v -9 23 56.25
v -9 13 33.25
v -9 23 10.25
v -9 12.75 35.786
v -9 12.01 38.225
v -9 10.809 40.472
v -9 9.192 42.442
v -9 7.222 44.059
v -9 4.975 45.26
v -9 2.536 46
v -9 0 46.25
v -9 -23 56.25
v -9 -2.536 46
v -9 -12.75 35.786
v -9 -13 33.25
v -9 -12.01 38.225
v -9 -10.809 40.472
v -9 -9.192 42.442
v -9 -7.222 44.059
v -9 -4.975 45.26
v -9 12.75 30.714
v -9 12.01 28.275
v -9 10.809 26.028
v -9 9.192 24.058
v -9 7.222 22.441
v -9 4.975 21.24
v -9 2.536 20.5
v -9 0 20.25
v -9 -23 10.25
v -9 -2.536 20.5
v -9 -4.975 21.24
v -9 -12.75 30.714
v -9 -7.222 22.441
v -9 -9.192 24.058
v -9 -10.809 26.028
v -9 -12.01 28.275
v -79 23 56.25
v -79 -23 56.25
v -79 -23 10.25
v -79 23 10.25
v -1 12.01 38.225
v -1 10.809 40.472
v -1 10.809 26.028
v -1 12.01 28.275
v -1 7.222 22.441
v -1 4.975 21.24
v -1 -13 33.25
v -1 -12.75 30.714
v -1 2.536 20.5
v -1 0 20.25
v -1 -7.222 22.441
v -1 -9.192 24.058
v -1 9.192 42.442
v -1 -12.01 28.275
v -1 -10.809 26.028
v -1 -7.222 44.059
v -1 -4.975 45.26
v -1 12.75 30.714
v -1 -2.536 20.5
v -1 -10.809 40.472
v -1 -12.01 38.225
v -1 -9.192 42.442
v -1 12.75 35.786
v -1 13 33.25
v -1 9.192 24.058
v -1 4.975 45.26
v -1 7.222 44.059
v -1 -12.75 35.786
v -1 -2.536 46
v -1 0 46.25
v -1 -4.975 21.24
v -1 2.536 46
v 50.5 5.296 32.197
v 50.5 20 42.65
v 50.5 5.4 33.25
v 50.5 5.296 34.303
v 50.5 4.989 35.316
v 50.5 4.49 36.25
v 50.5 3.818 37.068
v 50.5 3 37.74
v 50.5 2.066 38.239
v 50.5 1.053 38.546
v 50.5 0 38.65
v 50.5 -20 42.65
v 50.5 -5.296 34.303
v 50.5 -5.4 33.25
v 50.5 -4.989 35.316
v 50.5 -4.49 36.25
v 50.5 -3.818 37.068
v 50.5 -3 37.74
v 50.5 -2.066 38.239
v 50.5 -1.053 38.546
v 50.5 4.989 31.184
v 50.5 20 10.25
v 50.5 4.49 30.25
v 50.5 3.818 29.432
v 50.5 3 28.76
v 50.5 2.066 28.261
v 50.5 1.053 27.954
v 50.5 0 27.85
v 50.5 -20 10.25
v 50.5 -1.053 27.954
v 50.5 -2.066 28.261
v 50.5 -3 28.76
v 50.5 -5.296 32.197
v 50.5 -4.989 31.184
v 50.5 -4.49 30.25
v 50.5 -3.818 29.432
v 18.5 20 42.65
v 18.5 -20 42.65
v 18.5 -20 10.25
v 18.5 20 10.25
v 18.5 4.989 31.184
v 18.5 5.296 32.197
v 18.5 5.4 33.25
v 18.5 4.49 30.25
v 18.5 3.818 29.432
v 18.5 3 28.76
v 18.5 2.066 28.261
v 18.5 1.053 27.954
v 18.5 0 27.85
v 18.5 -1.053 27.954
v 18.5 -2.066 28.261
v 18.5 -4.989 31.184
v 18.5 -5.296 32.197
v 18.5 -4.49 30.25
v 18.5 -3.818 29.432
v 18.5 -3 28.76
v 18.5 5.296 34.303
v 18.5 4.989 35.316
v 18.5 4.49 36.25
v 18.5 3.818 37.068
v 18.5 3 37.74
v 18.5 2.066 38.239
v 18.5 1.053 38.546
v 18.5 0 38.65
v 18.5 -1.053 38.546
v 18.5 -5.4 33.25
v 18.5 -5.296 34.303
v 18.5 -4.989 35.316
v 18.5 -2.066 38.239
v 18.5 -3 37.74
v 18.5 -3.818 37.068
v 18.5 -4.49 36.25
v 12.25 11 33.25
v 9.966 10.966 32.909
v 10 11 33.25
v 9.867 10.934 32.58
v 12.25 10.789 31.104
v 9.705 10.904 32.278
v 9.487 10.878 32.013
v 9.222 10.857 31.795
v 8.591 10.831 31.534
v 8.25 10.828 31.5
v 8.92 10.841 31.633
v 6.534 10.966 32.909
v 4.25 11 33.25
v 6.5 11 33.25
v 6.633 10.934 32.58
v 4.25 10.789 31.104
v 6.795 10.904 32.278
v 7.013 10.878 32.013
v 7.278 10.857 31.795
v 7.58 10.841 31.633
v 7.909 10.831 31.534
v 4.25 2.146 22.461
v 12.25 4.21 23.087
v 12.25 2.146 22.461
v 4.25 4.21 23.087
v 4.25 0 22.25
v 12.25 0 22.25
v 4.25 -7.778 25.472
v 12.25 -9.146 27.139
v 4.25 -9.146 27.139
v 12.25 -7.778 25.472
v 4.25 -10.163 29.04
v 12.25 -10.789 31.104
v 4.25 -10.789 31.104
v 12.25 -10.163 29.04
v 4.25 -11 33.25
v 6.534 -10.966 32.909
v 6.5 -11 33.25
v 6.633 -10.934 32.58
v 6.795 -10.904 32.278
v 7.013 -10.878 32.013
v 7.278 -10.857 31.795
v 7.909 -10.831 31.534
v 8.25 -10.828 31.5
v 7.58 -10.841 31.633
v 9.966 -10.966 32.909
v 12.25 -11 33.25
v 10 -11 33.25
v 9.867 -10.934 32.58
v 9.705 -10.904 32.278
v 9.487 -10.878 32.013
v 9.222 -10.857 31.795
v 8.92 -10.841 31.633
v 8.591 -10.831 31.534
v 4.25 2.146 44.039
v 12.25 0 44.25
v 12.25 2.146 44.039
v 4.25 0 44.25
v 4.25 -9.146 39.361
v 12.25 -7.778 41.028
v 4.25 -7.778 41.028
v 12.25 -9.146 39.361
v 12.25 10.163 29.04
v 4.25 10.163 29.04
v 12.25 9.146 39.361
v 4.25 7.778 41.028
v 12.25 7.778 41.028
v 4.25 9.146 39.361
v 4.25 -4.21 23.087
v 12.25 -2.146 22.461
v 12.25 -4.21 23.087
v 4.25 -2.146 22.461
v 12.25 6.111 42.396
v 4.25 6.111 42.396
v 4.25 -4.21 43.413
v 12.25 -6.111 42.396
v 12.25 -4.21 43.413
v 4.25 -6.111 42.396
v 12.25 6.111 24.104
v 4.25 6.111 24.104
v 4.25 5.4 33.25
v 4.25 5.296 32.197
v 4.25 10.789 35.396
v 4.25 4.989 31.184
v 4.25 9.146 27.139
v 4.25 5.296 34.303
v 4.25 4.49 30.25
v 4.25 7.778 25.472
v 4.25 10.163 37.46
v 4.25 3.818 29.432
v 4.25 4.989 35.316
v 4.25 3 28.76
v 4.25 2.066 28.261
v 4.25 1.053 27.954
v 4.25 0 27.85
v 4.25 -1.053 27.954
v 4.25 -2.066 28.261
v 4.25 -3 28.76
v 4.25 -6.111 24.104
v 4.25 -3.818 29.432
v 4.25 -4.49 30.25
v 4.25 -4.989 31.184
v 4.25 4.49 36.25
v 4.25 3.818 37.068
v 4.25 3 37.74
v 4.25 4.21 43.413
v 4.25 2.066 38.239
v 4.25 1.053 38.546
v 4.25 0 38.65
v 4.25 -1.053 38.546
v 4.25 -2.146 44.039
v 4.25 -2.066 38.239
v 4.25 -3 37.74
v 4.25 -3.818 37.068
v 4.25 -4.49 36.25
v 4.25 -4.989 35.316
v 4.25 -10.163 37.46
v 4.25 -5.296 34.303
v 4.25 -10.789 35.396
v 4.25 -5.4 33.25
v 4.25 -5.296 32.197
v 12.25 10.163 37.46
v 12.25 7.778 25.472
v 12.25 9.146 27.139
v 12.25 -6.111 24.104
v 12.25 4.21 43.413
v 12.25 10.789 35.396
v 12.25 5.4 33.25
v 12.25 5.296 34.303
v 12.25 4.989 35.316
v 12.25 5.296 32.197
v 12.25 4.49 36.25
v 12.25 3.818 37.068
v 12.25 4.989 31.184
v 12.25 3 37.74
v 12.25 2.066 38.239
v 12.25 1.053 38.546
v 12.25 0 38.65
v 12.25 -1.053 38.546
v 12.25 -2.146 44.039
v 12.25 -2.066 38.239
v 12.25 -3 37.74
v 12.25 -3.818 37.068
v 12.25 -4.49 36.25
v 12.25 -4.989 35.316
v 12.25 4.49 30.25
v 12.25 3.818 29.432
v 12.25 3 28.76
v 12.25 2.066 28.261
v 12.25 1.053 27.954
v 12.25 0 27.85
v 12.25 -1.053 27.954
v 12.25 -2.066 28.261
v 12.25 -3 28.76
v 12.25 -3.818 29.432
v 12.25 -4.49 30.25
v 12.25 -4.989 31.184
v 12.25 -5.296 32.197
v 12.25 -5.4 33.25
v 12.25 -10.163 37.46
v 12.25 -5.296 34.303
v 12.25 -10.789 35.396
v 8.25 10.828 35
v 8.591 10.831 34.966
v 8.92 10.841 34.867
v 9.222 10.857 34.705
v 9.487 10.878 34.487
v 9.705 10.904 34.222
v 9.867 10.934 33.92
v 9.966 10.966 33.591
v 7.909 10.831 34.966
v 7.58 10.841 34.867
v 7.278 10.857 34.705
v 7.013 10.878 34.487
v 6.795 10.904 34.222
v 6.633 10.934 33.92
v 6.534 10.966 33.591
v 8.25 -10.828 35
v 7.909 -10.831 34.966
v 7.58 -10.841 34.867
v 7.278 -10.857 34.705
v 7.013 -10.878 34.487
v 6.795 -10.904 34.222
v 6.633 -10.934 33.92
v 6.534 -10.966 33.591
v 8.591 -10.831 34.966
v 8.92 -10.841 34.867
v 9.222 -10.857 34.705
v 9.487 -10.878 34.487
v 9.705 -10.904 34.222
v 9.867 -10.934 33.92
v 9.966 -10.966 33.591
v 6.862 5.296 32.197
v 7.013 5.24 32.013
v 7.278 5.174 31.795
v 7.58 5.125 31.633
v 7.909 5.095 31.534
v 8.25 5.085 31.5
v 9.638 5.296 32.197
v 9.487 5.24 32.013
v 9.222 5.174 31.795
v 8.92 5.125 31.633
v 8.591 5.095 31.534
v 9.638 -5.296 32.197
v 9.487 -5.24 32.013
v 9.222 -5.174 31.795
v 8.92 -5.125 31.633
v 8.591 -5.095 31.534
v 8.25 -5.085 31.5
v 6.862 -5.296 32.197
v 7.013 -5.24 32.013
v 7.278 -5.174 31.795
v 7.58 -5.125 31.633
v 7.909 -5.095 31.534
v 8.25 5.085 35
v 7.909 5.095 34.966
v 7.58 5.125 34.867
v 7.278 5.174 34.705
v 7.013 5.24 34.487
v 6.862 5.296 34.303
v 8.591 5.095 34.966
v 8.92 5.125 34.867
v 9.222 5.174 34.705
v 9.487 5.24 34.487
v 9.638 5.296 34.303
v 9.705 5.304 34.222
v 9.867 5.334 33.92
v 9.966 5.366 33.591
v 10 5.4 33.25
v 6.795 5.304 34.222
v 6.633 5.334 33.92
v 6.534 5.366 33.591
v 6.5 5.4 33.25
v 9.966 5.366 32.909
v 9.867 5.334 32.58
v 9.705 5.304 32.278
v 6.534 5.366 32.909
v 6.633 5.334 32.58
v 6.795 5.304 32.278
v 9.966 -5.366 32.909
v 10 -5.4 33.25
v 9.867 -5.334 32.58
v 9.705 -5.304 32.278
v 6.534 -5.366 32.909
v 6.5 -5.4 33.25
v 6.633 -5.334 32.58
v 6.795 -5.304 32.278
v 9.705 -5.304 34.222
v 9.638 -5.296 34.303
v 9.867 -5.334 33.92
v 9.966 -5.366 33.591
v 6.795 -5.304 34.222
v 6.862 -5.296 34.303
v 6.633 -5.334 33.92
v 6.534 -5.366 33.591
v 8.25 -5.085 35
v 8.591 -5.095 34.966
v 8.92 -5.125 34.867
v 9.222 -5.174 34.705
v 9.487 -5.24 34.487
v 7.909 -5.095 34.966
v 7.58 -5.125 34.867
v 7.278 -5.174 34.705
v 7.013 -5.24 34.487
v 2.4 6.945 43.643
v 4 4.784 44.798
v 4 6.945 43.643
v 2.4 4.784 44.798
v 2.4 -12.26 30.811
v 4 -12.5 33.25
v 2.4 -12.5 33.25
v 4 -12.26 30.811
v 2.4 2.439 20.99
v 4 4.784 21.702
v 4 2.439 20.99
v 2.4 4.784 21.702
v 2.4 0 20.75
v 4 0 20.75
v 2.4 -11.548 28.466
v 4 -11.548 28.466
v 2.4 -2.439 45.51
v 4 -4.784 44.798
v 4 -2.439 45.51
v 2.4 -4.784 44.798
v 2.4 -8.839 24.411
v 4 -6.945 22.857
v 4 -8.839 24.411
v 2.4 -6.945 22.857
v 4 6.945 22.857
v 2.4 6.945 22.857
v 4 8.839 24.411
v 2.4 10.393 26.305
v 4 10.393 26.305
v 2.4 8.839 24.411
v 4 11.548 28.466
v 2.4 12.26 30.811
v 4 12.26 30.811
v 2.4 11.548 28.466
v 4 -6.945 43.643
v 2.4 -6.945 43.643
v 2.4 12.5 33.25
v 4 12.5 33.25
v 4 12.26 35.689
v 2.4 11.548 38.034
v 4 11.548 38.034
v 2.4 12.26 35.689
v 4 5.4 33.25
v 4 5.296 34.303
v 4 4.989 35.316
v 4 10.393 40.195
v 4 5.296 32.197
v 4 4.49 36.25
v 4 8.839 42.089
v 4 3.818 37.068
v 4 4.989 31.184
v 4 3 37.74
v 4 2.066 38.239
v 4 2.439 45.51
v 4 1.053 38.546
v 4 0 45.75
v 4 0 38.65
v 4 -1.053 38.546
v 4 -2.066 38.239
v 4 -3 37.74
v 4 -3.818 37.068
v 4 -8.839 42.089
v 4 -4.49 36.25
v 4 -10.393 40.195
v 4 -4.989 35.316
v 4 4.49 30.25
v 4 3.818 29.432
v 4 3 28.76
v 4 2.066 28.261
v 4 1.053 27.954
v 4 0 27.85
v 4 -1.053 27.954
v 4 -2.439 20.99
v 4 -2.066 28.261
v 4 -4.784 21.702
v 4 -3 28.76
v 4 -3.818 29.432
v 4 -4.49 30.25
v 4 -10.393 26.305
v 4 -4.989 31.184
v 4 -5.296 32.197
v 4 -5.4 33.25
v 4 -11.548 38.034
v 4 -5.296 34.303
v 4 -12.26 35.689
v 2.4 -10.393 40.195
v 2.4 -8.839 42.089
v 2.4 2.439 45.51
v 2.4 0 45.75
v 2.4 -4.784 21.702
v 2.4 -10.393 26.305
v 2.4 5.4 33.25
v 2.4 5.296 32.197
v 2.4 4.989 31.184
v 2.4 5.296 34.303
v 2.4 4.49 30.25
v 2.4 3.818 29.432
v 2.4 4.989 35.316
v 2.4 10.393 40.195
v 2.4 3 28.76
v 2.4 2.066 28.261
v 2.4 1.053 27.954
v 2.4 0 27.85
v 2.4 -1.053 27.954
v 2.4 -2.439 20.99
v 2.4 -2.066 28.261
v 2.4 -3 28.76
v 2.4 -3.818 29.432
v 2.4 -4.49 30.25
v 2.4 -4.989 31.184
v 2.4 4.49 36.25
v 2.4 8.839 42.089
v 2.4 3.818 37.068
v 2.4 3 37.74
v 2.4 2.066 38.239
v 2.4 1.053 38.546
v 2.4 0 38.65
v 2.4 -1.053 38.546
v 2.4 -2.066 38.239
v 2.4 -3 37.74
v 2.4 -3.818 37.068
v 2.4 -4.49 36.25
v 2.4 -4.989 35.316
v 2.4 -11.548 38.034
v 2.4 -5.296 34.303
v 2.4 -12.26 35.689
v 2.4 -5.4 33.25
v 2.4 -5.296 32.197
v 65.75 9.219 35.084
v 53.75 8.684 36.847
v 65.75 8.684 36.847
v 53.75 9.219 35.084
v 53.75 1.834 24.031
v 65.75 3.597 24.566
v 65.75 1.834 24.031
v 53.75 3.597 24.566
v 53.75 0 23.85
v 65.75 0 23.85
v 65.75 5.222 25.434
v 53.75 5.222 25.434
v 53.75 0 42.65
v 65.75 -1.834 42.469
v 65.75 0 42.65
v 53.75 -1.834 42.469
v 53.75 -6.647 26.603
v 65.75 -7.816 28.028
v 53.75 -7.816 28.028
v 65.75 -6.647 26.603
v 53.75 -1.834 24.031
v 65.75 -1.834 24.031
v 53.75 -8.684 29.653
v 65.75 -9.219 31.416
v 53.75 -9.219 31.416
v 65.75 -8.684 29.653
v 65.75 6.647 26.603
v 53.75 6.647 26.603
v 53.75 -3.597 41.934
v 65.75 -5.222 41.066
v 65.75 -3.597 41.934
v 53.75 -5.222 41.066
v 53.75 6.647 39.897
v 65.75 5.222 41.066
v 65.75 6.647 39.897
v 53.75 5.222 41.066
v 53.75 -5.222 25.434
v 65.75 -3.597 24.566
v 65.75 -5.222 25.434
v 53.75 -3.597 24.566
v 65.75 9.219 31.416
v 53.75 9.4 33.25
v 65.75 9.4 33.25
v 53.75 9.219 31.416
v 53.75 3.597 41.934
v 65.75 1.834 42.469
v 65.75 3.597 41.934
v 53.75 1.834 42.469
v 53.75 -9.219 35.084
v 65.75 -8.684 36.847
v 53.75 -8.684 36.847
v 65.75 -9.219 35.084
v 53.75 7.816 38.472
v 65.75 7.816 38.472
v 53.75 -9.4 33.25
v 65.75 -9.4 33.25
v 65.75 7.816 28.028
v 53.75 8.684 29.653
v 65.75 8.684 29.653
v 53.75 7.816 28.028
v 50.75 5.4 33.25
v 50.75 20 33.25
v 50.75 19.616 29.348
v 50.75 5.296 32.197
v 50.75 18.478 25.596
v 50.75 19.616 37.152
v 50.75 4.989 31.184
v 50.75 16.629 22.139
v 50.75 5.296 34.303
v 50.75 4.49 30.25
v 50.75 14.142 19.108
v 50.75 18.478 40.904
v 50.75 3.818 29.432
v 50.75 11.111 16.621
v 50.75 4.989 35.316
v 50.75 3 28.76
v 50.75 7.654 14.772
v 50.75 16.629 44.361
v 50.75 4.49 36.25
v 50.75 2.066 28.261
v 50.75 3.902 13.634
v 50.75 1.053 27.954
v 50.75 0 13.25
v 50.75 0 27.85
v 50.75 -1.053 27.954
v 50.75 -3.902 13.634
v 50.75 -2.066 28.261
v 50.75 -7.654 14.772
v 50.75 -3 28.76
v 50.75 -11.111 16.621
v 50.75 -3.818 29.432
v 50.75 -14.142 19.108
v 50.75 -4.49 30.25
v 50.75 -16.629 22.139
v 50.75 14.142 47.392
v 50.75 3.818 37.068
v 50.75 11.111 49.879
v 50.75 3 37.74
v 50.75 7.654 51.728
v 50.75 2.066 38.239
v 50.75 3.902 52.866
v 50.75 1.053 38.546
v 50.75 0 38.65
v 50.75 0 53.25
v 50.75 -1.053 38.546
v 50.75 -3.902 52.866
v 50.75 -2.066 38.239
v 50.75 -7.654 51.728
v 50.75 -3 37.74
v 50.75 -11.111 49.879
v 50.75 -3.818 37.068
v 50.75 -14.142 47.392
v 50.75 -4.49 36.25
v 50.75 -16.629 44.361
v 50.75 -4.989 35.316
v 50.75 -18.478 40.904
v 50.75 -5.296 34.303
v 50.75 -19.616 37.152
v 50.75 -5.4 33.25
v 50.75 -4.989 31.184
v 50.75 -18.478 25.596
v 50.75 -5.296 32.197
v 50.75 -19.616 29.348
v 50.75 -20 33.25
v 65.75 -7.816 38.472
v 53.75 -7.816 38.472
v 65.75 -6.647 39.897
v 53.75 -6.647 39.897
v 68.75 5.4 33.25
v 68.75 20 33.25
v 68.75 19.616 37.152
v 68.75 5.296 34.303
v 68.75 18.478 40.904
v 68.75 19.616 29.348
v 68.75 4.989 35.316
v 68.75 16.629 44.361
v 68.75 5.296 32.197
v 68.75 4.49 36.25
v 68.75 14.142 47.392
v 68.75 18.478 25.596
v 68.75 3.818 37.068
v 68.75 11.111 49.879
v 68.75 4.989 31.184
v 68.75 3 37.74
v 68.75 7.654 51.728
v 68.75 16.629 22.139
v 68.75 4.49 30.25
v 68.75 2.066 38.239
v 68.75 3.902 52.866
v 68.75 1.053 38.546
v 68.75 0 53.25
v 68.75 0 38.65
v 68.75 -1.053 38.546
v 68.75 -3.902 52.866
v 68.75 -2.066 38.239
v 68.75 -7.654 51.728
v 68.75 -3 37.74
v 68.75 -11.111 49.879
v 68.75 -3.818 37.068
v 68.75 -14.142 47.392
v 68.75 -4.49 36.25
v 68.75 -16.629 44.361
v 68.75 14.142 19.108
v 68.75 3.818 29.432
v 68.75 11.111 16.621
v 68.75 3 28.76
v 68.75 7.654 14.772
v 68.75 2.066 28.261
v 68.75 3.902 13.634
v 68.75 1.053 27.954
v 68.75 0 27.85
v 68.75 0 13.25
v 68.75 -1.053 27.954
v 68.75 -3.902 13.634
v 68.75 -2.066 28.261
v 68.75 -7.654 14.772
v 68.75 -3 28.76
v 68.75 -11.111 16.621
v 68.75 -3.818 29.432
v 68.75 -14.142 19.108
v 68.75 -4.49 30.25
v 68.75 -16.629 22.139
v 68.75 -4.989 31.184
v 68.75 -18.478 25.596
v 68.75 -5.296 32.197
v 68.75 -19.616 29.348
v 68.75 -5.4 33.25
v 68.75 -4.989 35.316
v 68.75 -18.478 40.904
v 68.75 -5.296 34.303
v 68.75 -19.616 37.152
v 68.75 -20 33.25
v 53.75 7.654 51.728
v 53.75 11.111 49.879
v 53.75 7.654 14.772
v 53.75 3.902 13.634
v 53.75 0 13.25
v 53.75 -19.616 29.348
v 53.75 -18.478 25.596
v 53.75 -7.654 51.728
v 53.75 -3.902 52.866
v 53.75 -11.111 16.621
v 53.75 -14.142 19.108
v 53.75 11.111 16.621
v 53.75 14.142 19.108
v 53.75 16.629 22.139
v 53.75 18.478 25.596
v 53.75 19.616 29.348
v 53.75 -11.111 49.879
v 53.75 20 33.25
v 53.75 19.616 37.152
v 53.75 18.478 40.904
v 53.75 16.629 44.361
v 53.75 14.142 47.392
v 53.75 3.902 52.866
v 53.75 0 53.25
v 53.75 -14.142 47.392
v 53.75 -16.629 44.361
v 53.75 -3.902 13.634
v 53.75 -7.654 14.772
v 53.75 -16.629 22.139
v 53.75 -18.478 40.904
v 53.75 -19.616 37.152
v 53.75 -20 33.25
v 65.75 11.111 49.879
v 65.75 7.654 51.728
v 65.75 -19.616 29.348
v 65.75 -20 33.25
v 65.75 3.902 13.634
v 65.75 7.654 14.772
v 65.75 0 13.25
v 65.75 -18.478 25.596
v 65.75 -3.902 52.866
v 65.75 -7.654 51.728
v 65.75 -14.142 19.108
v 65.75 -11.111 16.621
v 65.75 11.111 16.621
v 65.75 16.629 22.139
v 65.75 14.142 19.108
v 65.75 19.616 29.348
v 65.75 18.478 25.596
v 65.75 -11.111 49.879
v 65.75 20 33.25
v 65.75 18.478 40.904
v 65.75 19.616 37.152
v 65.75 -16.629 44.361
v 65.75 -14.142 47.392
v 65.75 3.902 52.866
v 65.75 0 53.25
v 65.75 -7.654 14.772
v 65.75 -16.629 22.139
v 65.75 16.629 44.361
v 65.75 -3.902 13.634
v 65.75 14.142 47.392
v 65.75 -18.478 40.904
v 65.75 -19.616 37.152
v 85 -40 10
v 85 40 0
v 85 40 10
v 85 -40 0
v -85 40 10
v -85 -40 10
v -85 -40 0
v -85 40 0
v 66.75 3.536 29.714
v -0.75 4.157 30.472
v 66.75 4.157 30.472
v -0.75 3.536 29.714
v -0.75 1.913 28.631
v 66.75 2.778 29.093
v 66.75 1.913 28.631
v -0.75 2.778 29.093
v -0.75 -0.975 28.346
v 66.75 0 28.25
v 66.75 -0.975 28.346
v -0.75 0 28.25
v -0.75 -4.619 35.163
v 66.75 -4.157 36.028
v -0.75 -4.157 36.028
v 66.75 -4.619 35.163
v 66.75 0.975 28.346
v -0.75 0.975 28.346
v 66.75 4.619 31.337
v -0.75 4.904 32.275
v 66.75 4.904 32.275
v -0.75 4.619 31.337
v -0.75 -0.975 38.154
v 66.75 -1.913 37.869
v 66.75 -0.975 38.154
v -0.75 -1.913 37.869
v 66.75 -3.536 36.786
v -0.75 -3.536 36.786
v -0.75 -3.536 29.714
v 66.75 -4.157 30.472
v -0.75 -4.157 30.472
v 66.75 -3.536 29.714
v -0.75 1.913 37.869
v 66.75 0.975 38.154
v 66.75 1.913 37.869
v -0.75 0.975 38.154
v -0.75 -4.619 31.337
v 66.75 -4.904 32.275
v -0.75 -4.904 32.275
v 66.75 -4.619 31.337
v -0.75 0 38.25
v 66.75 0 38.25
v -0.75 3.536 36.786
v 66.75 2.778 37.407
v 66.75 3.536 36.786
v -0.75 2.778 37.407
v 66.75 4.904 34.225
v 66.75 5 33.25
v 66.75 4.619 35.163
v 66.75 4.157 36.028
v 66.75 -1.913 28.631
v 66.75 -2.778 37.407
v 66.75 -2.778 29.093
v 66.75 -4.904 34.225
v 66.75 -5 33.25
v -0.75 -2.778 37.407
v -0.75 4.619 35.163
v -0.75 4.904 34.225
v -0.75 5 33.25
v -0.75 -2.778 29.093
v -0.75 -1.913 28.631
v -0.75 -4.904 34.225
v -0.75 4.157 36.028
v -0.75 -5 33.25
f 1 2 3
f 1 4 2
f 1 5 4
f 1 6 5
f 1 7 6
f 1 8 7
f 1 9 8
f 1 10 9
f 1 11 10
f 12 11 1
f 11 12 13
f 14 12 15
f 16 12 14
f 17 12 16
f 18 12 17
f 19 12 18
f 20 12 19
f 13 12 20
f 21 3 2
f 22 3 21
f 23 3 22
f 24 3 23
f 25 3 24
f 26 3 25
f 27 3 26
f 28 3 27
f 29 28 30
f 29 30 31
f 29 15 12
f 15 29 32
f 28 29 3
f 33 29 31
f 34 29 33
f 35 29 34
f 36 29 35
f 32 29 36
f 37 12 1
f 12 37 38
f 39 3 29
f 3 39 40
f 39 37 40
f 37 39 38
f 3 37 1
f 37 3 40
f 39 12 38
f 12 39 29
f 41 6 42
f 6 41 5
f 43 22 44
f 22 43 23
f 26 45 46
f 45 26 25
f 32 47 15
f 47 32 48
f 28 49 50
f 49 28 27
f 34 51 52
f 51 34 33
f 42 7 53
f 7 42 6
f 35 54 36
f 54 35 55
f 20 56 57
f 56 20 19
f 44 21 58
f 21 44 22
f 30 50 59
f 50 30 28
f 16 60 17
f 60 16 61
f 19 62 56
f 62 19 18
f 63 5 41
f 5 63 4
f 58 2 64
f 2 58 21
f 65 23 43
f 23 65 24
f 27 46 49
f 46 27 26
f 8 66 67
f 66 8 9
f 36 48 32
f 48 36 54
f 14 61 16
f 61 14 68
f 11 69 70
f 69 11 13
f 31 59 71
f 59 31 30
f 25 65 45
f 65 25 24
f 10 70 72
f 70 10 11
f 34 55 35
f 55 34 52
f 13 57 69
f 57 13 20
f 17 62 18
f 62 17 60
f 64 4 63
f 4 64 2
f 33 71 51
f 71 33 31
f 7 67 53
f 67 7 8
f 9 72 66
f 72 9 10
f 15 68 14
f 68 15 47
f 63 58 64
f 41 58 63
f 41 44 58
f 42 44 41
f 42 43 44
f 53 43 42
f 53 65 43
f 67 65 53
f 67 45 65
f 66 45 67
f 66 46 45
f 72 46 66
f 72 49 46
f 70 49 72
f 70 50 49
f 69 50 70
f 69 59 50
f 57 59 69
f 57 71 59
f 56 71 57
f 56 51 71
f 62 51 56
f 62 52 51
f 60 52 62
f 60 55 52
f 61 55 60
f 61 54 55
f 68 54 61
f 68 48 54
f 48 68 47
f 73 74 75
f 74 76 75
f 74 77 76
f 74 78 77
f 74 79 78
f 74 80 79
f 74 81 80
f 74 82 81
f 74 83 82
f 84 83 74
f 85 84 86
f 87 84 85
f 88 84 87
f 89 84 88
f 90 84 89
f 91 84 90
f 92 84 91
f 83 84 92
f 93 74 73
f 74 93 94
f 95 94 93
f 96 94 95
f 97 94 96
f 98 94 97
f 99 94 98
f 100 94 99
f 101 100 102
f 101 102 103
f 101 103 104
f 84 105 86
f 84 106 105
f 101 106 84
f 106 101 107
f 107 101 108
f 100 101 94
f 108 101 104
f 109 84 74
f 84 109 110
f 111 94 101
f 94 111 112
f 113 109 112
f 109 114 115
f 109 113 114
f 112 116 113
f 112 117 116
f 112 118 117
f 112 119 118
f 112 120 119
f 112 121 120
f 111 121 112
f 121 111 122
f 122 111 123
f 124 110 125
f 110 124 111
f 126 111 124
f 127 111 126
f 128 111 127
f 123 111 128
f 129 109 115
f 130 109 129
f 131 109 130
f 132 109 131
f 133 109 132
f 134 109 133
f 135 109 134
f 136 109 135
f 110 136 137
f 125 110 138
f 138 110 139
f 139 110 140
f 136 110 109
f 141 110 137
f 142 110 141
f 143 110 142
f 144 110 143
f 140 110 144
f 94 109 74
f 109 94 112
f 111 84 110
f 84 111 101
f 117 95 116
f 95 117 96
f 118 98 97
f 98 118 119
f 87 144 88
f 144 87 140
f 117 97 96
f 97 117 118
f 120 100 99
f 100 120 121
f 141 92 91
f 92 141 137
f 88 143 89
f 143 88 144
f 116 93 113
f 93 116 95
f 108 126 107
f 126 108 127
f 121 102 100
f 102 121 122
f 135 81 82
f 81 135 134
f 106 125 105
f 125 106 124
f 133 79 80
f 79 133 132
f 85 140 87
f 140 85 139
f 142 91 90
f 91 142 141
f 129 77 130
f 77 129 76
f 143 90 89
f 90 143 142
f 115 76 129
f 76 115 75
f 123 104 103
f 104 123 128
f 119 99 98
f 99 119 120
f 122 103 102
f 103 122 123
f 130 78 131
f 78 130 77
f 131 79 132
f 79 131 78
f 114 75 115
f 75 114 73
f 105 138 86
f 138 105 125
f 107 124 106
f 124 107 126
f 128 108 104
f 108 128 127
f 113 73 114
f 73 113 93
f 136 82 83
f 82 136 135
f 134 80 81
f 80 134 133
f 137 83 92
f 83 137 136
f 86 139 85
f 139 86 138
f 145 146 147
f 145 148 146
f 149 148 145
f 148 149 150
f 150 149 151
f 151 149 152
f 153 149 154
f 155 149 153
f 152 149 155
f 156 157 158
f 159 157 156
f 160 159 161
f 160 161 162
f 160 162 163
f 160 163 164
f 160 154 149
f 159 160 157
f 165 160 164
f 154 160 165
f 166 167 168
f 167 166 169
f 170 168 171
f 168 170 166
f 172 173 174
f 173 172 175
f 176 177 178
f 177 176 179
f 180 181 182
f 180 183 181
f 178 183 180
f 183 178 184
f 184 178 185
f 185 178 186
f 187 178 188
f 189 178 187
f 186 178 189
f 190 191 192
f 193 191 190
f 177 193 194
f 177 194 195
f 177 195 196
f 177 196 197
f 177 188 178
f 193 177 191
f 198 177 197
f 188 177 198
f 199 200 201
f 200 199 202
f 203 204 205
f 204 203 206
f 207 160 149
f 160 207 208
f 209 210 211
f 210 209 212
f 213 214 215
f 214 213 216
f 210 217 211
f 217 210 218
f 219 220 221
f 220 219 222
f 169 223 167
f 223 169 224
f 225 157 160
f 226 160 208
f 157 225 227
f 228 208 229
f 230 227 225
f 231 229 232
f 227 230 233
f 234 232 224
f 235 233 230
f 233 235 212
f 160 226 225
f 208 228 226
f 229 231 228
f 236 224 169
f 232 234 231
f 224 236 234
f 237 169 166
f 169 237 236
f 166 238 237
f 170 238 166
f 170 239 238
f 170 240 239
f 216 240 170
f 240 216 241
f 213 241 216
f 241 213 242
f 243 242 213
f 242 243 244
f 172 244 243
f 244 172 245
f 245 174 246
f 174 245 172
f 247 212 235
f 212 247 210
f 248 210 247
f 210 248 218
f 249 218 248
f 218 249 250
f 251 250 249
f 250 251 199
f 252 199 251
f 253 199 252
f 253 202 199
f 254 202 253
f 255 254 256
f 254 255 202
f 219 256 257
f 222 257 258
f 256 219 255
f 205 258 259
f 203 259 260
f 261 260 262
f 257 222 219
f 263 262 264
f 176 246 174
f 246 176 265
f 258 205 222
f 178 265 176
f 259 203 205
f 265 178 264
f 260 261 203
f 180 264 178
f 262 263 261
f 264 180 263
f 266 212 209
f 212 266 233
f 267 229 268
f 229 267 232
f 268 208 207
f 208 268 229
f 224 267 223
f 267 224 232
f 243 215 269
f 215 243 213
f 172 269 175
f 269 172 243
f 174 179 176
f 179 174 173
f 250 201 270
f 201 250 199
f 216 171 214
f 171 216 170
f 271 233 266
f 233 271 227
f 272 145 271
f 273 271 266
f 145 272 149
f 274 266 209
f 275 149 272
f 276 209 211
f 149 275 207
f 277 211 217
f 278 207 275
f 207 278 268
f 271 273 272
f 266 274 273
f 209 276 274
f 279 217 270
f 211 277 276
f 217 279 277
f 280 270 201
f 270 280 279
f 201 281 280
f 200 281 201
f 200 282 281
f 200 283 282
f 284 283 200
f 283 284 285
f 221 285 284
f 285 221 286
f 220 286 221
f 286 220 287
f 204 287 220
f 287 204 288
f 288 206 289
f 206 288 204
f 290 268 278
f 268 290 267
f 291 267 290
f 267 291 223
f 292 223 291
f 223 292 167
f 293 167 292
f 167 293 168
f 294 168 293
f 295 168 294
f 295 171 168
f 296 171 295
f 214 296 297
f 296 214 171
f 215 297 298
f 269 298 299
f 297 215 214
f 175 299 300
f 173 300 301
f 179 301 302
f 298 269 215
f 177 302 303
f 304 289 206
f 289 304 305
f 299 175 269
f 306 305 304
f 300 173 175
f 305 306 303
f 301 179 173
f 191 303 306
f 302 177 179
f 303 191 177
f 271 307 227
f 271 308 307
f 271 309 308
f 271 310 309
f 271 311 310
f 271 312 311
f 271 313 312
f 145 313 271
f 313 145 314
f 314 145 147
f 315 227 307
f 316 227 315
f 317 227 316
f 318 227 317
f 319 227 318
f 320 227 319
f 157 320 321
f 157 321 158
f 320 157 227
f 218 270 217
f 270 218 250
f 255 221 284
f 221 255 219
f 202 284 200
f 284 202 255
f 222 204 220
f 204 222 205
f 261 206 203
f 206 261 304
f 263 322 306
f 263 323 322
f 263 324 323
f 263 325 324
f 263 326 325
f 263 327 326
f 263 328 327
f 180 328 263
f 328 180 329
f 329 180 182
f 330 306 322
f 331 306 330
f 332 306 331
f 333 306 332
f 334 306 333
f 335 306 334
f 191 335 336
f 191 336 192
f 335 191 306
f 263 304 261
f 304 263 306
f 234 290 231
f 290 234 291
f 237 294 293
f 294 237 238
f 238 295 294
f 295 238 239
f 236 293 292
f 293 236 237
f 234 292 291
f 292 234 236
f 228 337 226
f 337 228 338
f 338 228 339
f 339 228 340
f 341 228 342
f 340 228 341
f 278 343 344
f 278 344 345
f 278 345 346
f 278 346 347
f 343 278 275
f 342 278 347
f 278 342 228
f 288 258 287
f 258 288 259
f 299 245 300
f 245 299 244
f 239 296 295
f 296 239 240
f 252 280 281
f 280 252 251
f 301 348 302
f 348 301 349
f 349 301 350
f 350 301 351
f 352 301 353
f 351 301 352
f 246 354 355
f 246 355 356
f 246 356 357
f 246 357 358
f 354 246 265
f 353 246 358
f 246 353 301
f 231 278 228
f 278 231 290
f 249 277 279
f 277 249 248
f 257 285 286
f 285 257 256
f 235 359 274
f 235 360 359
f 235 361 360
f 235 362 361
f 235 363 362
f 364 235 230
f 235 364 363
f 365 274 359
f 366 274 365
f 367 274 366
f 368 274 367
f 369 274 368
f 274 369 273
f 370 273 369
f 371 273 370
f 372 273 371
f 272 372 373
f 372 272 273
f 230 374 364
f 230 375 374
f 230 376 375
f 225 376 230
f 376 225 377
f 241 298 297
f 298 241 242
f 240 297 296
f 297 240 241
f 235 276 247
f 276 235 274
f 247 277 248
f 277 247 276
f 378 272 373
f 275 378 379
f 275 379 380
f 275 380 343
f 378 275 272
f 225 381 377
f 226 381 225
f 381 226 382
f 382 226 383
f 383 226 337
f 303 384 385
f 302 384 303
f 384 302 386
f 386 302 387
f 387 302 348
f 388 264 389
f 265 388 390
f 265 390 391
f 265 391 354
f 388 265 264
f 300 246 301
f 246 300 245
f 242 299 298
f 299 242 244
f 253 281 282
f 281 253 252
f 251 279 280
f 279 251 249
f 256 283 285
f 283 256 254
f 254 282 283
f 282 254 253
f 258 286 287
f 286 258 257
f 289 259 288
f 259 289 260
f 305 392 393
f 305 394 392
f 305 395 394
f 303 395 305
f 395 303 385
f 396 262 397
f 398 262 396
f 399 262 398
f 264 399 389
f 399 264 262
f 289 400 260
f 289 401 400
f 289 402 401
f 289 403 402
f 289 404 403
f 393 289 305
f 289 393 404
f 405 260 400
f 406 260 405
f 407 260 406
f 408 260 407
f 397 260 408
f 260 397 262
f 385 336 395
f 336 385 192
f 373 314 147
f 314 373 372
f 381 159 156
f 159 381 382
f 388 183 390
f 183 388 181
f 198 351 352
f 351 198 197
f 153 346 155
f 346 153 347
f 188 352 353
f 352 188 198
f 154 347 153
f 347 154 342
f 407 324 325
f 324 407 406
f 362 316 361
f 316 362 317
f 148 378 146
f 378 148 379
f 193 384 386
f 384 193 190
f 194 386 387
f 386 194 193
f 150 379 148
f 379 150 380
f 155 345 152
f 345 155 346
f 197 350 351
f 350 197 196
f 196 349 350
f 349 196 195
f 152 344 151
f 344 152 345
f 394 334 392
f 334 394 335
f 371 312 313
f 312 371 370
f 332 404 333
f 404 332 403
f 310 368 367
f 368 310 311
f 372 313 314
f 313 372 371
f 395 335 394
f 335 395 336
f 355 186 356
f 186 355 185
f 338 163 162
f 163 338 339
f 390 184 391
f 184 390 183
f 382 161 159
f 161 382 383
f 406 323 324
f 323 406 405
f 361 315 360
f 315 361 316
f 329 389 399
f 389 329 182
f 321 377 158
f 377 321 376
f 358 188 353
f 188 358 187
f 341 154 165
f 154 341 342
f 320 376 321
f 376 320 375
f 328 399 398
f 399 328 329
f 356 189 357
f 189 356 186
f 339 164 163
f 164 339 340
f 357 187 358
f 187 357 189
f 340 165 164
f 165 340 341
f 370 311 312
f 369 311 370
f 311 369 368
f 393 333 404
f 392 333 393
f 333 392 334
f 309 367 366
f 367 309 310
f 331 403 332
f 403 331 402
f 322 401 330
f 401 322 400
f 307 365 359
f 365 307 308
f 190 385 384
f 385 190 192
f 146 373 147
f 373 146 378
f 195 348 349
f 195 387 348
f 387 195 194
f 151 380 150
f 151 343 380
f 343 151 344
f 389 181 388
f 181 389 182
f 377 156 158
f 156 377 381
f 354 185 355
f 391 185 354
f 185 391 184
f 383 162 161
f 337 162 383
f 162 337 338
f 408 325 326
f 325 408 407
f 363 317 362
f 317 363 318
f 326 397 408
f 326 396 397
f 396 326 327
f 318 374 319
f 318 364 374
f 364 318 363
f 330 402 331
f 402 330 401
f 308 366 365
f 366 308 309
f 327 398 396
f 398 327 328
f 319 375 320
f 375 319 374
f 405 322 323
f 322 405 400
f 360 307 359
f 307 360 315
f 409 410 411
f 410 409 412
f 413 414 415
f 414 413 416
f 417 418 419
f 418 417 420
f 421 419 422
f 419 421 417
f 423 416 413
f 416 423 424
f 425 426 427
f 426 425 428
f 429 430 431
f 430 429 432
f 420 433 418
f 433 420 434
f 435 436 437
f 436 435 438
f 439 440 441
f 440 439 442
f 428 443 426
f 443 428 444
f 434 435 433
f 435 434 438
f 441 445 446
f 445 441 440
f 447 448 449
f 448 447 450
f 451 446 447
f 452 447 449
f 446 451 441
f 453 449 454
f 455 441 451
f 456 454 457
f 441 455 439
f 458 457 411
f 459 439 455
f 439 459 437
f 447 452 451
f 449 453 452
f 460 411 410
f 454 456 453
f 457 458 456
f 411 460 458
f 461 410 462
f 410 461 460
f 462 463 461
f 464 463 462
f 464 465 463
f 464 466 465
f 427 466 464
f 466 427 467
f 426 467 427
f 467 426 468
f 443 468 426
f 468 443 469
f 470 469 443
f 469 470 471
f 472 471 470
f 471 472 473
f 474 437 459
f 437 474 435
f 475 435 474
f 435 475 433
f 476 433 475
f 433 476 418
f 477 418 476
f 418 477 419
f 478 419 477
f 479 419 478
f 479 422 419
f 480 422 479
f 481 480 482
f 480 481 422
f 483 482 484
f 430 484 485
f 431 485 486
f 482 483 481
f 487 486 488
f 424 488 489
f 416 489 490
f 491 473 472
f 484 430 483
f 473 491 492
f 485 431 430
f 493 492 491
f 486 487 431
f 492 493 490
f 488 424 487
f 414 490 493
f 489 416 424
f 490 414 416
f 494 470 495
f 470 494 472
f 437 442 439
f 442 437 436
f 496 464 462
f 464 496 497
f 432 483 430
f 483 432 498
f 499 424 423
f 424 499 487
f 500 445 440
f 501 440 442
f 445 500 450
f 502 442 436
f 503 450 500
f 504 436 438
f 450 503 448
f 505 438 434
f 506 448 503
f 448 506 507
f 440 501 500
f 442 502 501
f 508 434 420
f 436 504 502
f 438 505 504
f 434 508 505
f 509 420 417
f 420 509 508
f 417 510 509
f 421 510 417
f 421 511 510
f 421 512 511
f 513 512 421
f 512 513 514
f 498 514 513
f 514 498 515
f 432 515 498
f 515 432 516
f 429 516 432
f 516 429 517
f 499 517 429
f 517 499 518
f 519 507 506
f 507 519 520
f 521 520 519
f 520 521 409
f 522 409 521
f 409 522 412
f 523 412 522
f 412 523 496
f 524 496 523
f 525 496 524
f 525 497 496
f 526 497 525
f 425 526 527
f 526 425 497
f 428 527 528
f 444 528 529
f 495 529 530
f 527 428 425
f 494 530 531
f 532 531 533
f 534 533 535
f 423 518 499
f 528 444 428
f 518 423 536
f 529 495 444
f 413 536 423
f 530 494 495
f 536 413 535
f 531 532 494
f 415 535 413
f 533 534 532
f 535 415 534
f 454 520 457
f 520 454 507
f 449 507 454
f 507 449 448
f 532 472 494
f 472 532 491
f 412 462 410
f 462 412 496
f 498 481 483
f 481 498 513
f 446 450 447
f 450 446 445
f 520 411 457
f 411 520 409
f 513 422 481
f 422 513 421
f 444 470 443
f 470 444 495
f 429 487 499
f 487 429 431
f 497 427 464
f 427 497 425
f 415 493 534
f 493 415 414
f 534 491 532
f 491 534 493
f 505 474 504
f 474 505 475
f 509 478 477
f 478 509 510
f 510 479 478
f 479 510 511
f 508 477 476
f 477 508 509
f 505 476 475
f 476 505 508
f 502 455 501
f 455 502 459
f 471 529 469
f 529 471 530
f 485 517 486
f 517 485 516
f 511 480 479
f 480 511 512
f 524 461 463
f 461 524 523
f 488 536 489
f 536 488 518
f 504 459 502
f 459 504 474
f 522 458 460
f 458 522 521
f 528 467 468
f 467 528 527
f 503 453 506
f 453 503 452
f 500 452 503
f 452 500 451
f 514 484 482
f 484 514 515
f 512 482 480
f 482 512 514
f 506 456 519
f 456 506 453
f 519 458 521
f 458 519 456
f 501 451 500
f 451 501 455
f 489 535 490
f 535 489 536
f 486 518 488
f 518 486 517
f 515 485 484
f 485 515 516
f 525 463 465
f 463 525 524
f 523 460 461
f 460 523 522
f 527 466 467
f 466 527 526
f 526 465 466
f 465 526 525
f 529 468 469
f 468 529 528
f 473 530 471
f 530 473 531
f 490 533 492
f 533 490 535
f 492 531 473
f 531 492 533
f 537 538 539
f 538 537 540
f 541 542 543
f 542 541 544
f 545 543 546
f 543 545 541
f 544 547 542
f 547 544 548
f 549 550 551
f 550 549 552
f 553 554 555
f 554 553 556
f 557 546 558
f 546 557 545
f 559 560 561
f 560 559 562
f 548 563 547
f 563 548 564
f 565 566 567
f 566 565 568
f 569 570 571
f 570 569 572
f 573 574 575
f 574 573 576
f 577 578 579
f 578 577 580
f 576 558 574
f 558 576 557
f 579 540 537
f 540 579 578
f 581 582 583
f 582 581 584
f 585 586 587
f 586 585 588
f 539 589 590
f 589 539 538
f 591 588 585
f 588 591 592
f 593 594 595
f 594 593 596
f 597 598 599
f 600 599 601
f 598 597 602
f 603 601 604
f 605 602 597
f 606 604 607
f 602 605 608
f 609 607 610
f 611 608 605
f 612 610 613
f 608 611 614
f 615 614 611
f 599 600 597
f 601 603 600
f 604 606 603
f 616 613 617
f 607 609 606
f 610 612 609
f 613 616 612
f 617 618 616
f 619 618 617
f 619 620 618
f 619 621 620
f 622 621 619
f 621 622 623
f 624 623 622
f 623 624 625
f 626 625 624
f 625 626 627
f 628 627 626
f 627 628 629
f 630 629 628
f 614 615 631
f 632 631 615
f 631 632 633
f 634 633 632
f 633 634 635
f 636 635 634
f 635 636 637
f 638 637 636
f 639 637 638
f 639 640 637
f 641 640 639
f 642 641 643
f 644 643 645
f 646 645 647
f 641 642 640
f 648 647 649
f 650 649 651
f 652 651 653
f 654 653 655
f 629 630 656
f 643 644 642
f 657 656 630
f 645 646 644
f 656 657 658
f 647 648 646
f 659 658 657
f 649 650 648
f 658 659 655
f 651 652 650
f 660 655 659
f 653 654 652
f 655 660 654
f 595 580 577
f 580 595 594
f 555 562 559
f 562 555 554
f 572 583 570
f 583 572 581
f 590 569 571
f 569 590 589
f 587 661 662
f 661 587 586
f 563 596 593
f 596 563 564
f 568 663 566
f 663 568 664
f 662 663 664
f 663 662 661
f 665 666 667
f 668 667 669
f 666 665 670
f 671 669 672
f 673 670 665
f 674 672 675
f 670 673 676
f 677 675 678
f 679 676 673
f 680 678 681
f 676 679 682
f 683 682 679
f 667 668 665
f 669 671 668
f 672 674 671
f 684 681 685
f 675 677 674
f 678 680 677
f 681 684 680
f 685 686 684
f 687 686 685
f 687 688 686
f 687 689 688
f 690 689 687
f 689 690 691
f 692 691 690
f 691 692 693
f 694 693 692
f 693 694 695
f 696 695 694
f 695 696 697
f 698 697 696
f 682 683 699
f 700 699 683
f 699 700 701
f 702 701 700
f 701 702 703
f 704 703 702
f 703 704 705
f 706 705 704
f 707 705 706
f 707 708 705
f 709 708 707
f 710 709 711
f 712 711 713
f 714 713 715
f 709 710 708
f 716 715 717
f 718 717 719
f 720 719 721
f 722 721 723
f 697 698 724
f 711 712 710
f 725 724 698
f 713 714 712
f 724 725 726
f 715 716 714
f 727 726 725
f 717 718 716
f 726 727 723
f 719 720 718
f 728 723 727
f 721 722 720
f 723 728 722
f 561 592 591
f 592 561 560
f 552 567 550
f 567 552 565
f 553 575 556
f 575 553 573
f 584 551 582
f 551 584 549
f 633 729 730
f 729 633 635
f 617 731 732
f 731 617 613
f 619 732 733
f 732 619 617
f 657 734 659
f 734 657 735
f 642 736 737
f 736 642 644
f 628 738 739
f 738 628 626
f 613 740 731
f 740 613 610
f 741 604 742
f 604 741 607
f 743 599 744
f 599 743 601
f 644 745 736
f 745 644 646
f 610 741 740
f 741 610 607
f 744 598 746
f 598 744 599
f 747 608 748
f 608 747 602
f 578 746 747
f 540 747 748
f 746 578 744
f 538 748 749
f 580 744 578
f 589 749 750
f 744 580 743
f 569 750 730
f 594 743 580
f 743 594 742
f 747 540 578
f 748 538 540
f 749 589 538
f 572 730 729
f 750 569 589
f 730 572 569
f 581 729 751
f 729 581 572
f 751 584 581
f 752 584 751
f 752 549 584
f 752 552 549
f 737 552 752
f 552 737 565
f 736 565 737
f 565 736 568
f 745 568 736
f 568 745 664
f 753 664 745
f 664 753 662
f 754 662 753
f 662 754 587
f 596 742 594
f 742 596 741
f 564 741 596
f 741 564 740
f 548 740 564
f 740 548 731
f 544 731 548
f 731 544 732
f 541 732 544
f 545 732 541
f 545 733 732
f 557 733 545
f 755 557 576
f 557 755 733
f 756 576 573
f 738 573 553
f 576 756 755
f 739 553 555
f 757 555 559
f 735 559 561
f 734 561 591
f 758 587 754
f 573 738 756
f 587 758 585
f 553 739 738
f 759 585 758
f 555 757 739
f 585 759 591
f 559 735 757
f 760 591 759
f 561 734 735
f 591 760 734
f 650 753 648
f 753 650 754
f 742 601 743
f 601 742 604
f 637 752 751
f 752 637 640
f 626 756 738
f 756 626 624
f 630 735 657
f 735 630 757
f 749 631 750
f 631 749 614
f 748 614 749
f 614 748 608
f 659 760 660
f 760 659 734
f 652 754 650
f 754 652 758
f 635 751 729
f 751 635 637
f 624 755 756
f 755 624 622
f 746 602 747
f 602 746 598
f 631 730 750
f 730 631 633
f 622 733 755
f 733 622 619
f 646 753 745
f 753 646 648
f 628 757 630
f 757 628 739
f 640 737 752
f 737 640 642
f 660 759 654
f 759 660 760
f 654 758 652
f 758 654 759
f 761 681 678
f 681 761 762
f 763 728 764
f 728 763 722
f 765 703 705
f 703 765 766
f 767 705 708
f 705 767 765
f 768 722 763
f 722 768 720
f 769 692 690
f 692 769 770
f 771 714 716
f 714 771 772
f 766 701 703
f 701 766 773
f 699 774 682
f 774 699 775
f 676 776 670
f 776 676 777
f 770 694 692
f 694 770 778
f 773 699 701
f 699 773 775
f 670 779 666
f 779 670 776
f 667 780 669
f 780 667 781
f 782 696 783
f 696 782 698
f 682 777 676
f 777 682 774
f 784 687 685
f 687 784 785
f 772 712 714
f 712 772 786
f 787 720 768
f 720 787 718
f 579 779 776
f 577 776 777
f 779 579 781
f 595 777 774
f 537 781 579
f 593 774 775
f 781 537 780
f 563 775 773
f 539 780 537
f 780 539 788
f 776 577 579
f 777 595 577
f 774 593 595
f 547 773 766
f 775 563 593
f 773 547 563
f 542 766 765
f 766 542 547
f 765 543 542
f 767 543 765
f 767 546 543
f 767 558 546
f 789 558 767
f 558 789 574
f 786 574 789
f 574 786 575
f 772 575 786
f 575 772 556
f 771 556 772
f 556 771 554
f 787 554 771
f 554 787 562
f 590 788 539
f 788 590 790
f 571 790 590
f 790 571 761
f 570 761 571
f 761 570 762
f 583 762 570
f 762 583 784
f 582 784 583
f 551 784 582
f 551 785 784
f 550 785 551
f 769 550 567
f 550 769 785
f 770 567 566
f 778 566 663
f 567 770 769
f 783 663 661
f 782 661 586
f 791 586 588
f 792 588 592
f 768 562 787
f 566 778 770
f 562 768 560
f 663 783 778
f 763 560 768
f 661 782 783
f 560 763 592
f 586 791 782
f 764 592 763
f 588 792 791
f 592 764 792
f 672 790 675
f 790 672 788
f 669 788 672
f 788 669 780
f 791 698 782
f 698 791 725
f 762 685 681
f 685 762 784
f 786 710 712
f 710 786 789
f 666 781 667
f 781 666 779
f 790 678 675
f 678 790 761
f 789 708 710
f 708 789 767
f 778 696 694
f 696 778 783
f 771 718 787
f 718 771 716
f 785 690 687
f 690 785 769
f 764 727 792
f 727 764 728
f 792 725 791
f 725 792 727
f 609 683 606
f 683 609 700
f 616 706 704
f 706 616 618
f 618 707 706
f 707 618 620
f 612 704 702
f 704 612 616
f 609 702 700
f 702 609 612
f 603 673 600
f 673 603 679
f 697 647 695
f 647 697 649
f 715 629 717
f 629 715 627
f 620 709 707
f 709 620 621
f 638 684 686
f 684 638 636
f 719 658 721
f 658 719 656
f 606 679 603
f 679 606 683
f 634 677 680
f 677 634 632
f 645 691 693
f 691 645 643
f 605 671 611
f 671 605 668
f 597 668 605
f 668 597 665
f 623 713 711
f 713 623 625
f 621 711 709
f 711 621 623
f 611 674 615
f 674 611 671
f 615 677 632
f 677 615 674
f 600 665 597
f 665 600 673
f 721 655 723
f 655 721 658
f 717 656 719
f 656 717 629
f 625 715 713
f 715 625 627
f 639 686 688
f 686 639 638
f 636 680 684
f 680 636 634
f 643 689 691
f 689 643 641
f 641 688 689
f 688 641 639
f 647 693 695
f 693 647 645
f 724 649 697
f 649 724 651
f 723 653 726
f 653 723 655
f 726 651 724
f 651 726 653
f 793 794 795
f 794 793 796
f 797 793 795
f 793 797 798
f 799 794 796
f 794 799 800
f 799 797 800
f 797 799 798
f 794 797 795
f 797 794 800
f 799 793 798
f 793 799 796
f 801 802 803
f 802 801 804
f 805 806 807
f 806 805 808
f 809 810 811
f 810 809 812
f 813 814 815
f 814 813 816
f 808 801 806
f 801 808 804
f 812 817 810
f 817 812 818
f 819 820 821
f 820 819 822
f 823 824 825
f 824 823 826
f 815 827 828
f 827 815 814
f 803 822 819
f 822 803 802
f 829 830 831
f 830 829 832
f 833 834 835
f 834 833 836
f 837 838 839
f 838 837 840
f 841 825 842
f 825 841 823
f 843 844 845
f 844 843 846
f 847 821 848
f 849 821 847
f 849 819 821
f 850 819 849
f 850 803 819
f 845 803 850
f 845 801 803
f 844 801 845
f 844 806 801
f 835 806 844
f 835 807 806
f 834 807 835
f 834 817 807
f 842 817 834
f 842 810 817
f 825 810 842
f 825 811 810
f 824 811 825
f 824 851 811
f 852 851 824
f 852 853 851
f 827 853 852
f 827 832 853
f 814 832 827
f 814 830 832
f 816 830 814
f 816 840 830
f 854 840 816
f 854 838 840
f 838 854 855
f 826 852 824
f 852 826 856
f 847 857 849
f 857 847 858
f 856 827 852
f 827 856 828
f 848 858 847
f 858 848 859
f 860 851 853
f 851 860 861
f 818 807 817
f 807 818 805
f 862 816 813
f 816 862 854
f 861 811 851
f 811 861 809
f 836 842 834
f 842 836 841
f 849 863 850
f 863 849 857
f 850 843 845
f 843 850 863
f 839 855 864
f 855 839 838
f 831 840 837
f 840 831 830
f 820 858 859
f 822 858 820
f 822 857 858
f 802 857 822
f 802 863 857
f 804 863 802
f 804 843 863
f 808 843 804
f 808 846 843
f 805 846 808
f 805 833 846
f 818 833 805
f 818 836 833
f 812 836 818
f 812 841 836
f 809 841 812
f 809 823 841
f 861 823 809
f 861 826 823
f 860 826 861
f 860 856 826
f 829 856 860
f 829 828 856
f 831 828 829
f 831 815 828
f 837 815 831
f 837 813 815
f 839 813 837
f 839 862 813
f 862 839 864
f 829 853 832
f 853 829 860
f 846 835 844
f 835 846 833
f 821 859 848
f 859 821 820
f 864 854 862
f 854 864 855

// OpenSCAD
$fn = 32;

// ------------------------------------------------------------------------
// Motor drive station: motor 70 x 46 mm, shaft d10, pulley d40
// Every part is its own module, assembly() places every instance.
// ------------------------------------------------------------------------

// --- part 1 ---
module station_bed() {
  difference() {
    translate([-85, -40, 0]) cube([170, 80, 10]);
  }
}

// --- part 2 ---
module drive_motor() {
  union() {
    translate([-35, -23, 0]) cube([70, 46, 46]);
    translate([39, 0, 23]) rotate([0, 90, 0]) cylinder(h = 8, d = 26, center = true);
  }
}

// --- part 3 ---
module pillow_block() {
  difference() {
    translate([-16, -20, 0]) cube([32, 40, 32.4]);
    translate([0, 0, 23]) rotate([0, 90, 0]) cylinder(h = 34, d = 10.8, center = true);
  }
}

// --- part 4 ---
module drive_shaft() {
  translate([0, 0, -33.75]) cylinder(h = 67.5, d = 10);
}

// --- part 5 ---
module shaft_collar() {
  difference() {
    cylinder(h = 8, d = 22);
    translate([0, 0, -1]) cylinder(h = 10, d = 10.8);
    translate([0, 0, 4]) rotate([90, 0, 0]) cylinder(h = 24, d = 3.5, center = true);
  }
}

// --- part 6 ---
module collar_washer() {
  difference() {
      translate([0, 0, 0]) cylinder(h = 1.6, d = 25);
      translate([0, 0, -1]) cylinder(h = 3.6, d = 10.8);
    }
}

// --- part 7 ---
module drive_pulley() {
  difference() {
    union() {
      cylinder(h = 18, d = 18.8);
      cylinder(h = 3, d = 40);
      translate([0, 0, 15]) cylinder(h = 3, d = 40);
    }
    translate([0, 0, -1]) cylinder(h = 20, d = 10.8);
  }
}

// --- assembly ---
module assembly() {
  color([0.80, 0.24, 0.20]) translate([0, 0, 0]) rotate([0, 0, 0]) station_bed();
  color([0.20, 0.45, 0.75]) translate([-44, 0, 10.25]) rotate([0, 0, 0]) drive_motor();
  color([0.25, 0.62, 0.32]) translate([34.5, 0, 10.25]) rotate([0, 0, 0]) pillow_block();
  color([0.92, 0.70, 0.18]) translate([33, 0, 33.25]) rotate([0, 90, 0]) drive_shaft();
  color([0.58, 0.35, 0.70]) translate([4.25, 0, 33.25]) rotate([0, 90, 0]) shaft_collar();
  color([0.16, 0.66, 0.66]) translate([2.4, 0, 33.25]) rotate([0, 90, 0]) collar_washer();
  color([0.85, 0.48, 0.18]) translate([50.75, 0, 33.25]) rotate([0, 90, 0]) drive_pulley();
}

assembly();
